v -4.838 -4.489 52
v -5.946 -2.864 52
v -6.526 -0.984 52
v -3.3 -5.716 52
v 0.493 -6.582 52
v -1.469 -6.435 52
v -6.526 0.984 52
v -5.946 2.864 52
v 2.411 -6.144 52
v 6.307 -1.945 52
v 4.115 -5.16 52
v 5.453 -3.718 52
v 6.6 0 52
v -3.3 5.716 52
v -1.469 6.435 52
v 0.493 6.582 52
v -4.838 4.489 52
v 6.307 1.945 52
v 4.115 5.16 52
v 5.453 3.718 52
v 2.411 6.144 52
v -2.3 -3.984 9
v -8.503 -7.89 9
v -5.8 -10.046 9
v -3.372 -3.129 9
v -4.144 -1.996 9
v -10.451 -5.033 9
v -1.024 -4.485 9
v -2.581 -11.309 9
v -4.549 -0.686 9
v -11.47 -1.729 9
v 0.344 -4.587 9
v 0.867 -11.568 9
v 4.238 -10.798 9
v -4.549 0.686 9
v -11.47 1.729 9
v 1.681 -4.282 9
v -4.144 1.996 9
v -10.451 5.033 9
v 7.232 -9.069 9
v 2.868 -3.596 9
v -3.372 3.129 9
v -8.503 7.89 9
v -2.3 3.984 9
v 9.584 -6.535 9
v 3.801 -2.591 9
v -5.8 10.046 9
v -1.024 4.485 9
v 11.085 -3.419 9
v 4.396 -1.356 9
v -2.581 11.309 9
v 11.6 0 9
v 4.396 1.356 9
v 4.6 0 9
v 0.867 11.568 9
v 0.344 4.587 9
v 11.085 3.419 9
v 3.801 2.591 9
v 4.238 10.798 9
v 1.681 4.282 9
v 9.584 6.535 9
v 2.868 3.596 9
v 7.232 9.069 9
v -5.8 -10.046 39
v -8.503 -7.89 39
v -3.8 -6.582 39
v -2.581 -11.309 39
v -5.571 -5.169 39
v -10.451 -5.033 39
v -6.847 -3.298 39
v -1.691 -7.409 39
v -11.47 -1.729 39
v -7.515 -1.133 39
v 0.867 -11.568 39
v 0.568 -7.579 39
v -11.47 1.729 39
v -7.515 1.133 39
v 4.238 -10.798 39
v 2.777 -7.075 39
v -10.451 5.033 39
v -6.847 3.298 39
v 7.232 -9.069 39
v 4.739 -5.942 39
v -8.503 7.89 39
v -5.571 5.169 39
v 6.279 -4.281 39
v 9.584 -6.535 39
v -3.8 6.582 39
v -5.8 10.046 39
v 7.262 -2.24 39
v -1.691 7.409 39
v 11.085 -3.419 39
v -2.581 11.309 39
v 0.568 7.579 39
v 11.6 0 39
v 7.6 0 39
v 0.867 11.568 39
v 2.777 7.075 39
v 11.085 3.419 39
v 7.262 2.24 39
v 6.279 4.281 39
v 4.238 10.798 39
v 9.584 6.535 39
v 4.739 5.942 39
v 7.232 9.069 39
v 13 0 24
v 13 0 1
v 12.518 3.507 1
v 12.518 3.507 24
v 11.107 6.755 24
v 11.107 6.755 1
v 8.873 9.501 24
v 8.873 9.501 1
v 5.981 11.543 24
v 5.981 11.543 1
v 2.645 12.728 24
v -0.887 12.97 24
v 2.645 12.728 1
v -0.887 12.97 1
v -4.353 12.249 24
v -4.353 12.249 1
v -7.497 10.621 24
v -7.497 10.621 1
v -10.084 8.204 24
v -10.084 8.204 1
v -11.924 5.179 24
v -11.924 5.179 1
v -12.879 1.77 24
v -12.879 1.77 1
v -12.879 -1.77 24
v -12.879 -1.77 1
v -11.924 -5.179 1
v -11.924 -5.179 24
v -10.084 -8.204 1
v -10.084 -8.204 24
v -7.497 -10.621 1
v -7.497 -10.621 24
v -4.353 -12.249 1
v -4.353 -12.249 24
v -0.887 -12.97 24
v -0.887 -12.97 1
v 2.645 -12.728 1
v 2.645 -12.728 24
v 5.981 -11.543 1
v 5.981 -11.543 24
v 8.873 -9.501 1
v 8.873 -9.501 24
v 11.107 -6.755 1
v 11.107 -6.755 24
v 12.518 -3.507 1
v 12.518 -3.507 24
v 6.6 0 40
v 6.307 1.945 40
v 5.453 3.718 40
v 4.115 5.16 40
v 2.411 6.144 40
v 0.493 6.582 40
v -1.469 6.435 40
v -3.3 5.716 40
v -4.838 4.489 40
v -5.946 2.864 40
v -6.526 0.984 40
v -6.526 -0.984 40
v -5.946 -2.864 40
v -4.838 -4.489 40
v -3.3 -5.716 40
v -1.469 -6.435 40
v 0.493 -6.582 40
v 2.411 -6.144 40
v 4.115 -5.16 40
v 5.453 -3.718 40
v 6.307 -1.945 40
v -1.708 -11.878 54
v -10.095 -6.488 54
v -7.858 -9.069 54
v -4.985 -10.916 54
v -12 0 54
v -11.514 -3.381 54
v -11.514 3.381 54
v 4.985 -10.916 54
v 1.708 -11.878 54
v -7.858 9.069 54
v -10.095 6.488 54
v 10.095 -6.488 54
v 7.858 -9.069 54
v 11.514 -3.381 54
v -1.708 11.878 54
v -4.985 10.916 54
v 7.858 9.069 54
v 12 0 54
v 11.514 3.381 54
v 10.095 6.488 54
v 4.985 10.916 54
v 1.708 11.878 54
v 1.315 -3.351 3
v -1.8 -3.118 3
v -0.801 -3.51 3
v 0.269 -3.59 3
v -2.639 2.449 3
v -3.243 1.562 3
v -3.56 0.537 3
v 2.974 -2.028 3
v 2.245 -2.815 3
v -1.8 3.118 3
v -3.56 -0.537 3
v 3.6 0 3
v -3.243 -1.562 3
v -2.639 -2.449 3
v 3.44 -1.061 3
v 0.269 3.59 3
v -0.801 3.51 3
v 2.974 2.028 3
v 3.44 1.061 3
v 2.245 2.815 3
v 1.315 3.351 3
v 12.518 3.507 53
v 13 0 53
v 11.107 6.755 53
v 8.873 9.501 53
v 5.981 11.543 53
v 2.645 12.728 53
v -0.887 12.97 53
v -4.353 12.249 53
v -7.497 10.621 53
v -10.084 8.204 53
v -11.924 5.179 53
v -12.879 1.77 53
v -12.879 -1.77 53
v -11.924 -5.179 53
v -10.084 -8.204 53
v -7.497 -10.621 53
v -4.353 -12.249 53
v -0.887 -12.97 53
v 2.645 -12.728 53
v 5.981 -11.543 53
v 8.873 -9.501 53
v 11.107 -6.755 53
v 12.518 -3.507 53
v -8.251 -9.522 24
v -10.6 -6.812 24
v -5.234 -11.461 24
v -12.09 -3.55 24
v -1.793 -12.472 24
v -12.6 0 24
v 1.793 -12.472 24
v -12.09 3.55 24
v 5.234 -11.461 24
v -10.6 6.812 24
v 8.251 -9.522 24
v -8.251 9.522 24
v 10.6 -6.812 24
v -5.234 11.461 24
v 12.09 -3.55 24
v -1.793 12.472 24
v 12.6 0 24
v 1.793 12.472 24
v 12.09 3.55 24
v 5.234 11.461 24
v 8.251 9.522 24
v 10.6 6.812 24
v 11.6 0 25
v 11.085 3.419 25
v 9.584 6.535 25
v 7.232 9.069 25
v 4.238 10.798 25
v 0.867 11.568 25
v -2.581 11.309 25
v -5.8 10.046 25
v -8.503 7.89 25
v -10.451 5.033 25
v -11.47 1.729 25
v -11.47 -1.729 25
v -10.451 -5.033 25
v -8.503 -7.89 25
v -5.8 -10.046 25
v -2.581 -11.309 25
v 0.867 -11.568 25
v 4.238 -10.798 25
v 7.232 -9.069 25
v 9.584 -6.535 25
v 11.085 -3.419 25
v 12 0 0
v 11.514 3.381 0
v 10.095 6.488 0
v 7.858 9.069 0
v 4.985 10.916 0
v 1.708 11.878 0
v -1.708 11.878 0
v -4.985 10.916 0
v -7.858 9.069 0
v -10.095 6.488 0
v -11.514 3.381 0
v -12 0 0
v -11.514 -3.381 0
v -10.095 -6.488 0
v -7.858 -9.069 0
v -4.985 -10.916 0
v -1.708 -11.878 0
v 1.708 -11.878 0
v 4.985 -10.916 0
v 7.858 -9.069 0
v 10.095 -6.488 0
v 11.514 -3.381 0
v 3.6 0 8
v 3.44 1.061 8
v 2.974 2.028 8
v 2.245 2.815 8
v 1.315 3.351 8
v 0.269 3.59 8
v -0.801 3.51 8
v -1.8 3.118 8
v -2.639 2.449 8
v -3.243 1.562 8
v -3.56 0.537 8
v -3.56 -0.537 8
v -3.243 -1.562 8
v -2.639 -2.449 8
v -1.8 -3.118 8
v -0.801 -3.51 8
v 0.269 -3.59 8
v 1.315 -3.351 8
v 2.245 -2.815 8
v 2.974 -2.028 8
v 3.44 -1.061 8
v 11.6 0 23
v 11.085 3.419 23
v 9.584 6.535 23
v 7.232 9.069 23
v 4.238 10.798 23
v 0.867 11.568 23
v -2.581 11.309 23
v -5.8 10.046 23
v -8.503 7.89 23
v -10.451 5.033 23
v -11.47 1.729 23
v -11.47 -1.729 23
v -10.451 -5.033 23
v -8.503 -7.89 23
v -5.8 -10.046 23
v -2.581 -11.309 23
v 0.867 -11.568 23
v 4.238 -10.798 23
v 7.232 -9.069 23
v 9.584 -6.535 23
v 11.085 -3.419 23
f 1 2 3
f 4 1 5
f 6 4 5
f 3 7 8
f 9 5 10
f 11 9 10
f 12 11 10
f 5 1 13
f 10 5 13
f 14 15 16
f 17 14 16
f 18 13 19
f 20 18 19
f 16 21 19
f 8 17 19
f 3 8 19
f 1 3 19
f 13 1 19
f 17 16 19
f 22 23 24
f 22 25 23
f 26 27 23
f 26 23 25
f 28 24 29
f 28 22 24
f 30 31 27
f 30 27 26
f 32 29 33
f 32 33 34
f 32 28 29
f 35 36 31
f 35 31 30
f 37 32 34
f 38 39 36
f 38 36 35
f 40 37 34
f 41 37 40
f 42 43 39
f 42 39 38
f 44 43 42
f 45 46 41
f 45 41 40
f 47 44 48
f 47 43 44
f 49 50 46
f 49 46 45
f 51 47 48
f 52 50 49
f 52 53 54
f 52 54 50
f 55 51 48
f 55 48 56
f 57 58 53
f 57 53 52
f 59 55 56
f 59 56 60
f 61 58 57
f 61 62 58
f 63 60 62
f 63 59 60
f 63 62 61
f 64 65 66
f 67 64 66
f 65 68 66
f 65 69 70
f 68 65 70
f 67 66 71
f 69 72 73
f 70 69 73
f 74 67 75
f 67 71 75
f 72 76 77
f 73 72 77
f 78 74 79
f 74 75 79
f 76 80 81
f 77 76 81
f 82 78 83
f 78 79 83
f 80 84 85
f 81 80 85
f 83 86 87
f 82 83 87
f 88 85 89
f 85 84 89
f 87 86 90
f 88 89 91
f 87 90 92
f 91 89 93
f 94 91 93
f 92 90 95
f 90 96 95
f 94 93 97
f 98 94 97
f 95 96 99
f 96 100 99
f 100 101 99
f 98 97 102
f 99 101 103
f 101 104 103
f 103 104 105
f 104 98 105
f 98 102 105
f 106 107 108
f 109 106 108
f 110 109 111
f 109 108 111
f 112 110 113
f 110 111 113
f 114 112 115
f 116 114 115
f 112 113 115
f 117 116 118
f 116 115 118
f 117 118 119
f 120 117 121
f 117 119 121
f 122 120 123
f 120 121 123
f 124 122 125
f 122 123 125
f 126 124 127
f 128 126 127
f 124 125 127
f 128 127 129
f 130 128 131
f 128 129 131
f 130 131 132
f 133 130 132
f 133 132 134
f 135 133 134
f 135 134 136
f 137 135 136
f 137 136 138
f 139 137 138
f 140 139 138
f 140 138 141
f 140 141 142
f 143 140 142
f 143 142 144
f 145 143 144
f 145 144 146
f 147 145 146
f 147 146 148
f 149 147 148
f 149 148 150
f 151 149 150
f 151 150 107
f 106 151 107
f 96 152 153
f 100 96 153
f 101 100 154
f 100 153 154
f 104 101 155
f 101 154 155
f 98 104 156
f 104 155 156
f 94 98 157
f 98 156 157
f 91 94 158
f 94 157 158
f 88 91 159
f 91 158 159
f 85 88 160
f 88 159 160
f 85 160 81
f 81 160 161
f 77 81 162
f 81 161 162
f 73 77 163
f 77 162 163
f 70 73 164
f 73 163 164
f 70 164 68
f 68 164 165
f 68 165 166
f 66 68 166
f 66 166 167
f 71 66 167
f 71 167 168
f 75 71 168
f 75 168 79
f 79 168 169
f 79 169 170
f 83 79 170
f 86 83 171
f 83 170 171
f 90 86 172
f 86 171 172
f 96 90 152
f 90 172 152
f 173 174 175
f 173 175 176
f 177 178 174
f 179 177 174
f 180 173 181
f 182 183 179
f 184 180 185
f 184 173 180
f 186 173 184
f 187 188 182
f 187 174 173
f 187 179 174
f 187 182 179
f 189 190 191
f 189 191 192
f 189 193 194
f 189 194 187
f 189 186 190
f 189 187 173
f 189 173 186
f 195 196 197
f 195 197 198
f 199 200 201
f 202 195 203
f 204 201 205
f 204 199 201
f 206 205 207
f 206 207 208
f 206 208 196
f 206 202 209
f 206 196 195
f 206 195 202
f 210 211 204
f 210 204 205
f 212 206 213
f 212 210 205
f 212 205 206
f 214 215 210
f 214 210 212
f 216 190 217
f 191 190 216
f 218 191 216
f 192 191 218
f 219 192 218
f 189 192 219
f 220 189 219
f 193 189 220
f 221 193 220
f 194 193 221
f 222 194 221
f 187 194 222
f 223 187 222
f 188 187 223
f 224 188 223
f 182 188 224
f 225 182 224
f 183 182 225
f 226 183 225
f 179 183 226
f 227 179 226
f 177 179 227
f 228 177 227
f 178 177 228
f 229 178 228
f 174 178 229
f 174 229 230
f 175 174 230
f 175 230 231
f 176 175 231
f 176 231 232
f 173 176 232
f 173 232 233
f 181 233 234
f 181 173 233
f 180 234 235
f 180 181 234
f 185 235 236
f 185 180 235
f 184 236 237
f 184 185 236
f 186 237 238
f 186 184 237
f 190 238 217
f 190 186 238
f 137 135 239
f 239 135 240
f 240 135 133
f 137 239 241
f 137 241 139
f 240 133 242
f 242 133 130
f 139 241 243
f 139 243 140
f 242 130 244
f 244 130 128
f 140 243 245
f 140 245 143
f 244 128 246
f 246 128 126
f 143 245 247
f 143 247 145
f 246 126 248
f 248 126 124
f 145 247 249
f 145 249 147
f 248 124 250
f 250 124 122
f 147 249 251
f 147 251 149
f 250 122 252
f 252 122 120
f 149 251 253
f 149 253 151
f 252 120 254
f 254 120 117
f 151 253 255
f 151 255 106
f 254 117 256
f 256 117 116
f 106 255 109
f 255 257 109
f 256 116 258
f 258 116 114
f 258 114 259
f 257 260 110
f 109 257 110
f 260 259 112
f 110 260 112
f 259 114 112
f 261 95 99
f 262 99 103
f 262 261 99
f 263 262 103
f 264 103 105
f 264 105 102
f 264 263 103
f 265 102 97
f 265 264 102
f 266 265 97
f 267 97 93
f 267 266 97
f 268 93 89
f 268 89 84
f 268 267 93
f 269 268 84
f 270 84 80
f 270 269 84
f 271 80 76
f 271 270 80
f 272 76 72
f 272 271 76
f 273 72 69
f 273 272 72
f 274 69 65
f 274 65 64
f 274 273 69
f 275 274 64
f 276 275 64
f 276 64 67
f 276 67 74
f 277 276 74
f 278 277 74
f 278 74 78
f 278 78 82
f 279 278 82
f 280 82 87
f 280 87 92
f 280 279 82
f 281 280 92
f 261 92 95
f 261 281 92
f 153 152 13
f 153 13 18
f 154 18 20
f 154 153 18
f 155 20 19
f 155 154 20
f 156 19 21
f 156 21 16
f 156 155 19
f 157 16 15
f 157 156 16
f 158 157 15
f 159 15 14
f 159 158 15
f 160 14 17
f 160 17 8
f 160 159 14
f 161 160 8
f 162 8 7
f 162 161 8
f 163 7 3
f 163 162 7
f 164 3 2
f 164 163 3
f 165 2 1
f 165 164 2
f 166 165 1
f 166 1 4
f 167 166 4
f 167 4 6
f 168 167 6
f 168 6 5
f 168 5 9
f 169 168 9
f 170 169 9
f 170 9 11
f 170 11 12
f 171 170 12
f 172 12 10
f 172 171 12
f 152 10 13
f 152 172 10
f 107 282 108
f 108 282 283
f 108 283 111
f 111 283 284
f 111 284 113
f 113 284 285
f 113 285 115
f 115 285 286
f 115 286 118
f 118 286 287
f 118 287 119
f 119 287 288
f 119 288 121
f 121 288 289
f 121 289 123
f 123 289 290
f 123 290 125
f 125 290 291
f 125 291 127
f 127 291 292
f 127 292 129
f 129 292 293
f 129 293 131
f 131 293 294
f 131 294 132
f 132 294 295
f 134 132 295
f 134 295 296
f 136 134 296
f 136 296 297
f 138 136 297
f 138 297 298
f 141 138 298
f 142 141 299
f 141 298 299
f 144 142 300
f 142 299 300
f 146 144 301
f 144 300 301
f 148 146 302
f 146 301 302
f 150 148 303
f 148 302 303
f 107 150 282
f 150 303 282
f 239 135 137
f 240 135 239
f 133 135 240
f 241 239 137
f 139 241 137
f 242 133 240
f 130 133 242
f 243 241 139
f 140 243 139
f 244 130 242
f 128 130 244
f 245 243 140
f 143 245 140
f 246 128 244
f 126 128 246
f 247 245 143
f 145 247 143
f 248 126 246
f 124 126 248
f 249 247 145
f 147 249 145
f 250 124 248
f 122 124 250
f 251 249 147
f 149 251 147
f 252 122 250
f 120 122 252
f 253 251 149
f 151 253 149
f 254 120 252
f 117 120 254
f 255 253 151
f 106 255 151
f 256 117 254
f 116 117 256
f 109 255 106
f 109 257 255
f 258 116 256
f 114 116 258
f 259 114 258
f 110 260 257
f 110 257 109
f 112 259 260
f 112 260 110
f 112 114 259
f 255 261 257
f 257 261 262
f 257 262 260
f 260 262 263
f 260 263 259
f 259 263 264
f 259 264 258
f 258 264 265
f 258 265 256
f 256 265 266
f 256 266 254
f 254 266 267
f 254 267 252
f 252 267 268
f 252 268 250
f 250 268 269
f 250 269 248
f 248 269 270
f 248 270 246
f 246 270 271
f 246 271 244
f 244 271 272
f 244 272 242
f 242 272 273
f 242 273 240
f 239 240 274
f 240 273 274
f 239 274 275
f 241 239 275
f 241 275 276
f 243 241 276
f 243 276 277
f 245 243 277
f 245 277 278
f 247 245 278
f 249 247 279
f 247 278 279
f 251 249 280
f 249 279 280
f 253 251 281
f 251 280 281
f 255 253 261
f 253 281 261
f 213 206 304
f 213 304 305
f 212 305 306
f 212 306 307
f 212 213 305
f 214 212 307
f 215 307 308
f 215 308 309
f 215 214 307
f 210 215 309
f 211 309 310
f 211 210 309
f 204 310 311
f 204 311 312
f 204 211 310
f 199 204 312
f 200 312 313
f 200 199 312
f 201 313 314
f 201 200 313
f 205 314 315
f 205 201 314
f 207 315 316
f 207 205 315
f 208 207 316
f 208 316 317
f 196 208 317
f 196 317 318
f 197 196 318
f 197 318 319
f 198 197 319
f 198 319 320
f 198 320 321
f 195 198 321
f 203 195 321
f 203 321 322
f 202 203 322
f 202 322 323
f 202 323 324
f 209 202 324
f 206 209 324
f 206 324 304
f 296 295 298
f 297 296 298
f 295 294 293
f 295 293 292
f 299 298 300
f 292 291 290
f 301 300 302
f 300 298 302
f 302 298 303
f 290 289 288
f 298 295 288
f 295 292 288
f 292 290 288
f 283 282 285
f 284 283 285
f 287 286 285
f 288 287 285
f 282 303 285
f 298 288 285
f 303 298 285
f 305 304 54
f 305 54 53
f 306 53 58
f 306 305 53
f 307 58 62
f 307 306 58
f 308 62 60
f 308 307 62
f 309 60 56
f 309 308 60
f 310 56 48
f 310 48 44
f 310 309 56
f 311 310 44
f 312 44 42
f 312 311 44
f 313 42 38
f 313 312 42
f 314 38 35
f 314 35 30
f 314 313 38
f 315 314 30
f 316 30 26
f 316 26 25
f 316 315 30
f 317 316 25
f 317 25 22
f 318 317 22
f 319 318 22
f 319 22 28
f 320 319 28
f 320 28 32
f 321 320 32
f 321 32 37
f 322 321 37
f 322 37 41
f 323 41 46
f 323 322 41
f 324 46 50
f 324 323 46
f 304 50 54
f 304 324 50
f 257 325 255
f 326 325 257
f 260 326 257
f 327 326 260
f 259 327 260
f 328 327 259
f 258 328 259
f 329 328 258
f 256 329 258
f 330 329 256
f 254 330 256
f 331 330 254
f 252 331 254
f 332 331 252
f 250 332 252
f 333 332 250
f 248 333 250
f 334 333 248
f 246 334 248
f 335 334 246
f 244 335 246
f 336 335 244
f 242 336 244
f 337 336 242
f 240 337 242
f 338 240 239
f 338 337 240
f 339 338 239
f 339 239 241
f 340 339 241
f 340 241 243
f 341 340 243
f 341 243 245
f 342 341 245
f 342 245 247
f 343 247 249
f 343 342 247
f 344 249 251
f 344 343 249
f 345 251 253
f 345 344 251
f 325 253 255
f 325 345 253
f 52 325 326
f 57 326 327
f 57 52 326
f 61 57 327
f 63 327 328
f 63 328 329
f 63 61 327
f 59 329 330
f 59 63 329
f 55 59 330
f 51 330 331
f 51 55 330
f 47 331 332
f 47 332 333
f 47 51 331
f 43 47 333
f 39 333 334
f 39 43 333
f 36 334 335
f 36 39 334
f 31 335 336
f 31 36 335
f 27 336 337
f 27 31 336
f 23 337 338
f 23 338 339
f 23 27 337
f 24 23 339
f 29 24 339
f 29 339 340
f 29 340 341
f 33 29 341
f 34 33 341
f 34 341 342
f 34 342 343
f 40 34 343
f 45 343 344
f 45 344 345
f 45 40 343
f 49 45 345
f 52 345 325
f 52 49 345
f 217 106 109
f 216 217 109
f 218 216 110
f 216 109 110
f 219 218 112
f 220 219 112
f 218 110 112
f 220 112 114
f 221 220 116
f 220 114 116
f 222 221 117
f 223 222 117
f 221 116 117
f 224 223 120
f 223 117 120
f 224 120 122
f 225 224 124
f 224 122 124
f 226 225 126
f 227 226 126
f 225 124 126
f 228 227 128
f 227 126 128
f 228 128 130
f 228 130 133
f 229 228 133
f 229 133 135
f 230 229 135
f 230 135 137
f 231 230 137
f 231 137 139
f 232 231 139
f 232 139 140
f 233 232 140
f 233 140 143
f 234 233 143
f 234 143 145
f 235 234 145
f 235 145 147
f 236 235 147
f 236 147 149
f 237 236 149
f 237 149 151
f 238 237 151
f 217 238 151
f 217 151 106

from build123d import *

# Parameters (mm, degrees)
F0_R      = 3.6
F1_DEPTH  = 3
F0_R_2    = 13
F2_DEPTH  = 9
F3_R      = 13
F3_R_2    = 11.6
F4_DEPTH  = 15
F5_R      = 13
F5_R_2    = 11.6
F6_DEPTH  = 15
F7_R      = 13
F7_R_2    = 11.6
F7_R_3    = 6.6
F8_DEPTH  = 13
F9_R      = 13
F9_R_2    = 6.6
F10_DEPTH = 2
F11_SIZE  = 1
F12_SIZE  = 1


with BuildPart() as f1:
    # F0 (on Top) → F1 (new body)
    with BuildSketch(Plane.XY):
        Circle(F0_R)
    extrude(amount=F1_DEPTH)

    # F0 (on Top) → F2 (join)
    with BuildSketch(Plane.XY):
        Circle(F0_R_2)
        Circle(F0_R, mode=Mode.SUBTRACT)
    extrude(amount=F2_DEPTH)

    # F3 (on face) → F4 (join)
    with BuildSketch(Plane.XY.offset(9)):
        Circle(F3_R)
        Circle(F3_R_2, mode=Mode.SUBTRACT)
    extrude(amount=F4_DEPTH)

    # F11
    f11_edges = [f1.edges().sort_by_distance(p)[0] for p in [
        (-11.6, 0, 24),
        (-3.6, 0, 9),
        (-13, 0, 0),
    ]]
    chamfer(f11_edges, length=F11_SIZE)


with BuildPart() as f6:
    # F5 (on face) → F6 (new body)
    with BuildSketch(Plane.XY.offset(24)):
        Circle(F5_R)
        Circle(F5_R_2, mode=Mode.SUBTRACT)
    extrude(amount=F6_DEPTH)

    # F7 (on face) → F8 (join)
    with BuildSketch(Plane.XY.offset(39)):
        Circle(F7_R)
        Circle(F7_R_2, mode=Mode.SUBTRACT)
        Circle(F7_R_2)
        Circle(F7_R_3, mode=Mode.SUBTRACT)
    extrude(amount=F8_DEPTH)

    # F9 (on face) → F10 (join)
    with BuildSketch(Plane.XY.offset(52)):
        Circle(F9_R)
        Circle(F9_R_2, mode=Mode.SUBTRACT)
        Circle(F9_R_2)
    extrude(amount=F10_DEPTH)

    # F12
    f12_edges = [f6.edges().sort_by_distance(p)[0] for p in [
        (-6.6, 0, 39),
        (-11.6, 0, 24),
        (-13, 0, 54),
    ]]
    chamfer(f12_edges, length=F12_SIZE)


solid = Compound([f1.part, f6.part])
